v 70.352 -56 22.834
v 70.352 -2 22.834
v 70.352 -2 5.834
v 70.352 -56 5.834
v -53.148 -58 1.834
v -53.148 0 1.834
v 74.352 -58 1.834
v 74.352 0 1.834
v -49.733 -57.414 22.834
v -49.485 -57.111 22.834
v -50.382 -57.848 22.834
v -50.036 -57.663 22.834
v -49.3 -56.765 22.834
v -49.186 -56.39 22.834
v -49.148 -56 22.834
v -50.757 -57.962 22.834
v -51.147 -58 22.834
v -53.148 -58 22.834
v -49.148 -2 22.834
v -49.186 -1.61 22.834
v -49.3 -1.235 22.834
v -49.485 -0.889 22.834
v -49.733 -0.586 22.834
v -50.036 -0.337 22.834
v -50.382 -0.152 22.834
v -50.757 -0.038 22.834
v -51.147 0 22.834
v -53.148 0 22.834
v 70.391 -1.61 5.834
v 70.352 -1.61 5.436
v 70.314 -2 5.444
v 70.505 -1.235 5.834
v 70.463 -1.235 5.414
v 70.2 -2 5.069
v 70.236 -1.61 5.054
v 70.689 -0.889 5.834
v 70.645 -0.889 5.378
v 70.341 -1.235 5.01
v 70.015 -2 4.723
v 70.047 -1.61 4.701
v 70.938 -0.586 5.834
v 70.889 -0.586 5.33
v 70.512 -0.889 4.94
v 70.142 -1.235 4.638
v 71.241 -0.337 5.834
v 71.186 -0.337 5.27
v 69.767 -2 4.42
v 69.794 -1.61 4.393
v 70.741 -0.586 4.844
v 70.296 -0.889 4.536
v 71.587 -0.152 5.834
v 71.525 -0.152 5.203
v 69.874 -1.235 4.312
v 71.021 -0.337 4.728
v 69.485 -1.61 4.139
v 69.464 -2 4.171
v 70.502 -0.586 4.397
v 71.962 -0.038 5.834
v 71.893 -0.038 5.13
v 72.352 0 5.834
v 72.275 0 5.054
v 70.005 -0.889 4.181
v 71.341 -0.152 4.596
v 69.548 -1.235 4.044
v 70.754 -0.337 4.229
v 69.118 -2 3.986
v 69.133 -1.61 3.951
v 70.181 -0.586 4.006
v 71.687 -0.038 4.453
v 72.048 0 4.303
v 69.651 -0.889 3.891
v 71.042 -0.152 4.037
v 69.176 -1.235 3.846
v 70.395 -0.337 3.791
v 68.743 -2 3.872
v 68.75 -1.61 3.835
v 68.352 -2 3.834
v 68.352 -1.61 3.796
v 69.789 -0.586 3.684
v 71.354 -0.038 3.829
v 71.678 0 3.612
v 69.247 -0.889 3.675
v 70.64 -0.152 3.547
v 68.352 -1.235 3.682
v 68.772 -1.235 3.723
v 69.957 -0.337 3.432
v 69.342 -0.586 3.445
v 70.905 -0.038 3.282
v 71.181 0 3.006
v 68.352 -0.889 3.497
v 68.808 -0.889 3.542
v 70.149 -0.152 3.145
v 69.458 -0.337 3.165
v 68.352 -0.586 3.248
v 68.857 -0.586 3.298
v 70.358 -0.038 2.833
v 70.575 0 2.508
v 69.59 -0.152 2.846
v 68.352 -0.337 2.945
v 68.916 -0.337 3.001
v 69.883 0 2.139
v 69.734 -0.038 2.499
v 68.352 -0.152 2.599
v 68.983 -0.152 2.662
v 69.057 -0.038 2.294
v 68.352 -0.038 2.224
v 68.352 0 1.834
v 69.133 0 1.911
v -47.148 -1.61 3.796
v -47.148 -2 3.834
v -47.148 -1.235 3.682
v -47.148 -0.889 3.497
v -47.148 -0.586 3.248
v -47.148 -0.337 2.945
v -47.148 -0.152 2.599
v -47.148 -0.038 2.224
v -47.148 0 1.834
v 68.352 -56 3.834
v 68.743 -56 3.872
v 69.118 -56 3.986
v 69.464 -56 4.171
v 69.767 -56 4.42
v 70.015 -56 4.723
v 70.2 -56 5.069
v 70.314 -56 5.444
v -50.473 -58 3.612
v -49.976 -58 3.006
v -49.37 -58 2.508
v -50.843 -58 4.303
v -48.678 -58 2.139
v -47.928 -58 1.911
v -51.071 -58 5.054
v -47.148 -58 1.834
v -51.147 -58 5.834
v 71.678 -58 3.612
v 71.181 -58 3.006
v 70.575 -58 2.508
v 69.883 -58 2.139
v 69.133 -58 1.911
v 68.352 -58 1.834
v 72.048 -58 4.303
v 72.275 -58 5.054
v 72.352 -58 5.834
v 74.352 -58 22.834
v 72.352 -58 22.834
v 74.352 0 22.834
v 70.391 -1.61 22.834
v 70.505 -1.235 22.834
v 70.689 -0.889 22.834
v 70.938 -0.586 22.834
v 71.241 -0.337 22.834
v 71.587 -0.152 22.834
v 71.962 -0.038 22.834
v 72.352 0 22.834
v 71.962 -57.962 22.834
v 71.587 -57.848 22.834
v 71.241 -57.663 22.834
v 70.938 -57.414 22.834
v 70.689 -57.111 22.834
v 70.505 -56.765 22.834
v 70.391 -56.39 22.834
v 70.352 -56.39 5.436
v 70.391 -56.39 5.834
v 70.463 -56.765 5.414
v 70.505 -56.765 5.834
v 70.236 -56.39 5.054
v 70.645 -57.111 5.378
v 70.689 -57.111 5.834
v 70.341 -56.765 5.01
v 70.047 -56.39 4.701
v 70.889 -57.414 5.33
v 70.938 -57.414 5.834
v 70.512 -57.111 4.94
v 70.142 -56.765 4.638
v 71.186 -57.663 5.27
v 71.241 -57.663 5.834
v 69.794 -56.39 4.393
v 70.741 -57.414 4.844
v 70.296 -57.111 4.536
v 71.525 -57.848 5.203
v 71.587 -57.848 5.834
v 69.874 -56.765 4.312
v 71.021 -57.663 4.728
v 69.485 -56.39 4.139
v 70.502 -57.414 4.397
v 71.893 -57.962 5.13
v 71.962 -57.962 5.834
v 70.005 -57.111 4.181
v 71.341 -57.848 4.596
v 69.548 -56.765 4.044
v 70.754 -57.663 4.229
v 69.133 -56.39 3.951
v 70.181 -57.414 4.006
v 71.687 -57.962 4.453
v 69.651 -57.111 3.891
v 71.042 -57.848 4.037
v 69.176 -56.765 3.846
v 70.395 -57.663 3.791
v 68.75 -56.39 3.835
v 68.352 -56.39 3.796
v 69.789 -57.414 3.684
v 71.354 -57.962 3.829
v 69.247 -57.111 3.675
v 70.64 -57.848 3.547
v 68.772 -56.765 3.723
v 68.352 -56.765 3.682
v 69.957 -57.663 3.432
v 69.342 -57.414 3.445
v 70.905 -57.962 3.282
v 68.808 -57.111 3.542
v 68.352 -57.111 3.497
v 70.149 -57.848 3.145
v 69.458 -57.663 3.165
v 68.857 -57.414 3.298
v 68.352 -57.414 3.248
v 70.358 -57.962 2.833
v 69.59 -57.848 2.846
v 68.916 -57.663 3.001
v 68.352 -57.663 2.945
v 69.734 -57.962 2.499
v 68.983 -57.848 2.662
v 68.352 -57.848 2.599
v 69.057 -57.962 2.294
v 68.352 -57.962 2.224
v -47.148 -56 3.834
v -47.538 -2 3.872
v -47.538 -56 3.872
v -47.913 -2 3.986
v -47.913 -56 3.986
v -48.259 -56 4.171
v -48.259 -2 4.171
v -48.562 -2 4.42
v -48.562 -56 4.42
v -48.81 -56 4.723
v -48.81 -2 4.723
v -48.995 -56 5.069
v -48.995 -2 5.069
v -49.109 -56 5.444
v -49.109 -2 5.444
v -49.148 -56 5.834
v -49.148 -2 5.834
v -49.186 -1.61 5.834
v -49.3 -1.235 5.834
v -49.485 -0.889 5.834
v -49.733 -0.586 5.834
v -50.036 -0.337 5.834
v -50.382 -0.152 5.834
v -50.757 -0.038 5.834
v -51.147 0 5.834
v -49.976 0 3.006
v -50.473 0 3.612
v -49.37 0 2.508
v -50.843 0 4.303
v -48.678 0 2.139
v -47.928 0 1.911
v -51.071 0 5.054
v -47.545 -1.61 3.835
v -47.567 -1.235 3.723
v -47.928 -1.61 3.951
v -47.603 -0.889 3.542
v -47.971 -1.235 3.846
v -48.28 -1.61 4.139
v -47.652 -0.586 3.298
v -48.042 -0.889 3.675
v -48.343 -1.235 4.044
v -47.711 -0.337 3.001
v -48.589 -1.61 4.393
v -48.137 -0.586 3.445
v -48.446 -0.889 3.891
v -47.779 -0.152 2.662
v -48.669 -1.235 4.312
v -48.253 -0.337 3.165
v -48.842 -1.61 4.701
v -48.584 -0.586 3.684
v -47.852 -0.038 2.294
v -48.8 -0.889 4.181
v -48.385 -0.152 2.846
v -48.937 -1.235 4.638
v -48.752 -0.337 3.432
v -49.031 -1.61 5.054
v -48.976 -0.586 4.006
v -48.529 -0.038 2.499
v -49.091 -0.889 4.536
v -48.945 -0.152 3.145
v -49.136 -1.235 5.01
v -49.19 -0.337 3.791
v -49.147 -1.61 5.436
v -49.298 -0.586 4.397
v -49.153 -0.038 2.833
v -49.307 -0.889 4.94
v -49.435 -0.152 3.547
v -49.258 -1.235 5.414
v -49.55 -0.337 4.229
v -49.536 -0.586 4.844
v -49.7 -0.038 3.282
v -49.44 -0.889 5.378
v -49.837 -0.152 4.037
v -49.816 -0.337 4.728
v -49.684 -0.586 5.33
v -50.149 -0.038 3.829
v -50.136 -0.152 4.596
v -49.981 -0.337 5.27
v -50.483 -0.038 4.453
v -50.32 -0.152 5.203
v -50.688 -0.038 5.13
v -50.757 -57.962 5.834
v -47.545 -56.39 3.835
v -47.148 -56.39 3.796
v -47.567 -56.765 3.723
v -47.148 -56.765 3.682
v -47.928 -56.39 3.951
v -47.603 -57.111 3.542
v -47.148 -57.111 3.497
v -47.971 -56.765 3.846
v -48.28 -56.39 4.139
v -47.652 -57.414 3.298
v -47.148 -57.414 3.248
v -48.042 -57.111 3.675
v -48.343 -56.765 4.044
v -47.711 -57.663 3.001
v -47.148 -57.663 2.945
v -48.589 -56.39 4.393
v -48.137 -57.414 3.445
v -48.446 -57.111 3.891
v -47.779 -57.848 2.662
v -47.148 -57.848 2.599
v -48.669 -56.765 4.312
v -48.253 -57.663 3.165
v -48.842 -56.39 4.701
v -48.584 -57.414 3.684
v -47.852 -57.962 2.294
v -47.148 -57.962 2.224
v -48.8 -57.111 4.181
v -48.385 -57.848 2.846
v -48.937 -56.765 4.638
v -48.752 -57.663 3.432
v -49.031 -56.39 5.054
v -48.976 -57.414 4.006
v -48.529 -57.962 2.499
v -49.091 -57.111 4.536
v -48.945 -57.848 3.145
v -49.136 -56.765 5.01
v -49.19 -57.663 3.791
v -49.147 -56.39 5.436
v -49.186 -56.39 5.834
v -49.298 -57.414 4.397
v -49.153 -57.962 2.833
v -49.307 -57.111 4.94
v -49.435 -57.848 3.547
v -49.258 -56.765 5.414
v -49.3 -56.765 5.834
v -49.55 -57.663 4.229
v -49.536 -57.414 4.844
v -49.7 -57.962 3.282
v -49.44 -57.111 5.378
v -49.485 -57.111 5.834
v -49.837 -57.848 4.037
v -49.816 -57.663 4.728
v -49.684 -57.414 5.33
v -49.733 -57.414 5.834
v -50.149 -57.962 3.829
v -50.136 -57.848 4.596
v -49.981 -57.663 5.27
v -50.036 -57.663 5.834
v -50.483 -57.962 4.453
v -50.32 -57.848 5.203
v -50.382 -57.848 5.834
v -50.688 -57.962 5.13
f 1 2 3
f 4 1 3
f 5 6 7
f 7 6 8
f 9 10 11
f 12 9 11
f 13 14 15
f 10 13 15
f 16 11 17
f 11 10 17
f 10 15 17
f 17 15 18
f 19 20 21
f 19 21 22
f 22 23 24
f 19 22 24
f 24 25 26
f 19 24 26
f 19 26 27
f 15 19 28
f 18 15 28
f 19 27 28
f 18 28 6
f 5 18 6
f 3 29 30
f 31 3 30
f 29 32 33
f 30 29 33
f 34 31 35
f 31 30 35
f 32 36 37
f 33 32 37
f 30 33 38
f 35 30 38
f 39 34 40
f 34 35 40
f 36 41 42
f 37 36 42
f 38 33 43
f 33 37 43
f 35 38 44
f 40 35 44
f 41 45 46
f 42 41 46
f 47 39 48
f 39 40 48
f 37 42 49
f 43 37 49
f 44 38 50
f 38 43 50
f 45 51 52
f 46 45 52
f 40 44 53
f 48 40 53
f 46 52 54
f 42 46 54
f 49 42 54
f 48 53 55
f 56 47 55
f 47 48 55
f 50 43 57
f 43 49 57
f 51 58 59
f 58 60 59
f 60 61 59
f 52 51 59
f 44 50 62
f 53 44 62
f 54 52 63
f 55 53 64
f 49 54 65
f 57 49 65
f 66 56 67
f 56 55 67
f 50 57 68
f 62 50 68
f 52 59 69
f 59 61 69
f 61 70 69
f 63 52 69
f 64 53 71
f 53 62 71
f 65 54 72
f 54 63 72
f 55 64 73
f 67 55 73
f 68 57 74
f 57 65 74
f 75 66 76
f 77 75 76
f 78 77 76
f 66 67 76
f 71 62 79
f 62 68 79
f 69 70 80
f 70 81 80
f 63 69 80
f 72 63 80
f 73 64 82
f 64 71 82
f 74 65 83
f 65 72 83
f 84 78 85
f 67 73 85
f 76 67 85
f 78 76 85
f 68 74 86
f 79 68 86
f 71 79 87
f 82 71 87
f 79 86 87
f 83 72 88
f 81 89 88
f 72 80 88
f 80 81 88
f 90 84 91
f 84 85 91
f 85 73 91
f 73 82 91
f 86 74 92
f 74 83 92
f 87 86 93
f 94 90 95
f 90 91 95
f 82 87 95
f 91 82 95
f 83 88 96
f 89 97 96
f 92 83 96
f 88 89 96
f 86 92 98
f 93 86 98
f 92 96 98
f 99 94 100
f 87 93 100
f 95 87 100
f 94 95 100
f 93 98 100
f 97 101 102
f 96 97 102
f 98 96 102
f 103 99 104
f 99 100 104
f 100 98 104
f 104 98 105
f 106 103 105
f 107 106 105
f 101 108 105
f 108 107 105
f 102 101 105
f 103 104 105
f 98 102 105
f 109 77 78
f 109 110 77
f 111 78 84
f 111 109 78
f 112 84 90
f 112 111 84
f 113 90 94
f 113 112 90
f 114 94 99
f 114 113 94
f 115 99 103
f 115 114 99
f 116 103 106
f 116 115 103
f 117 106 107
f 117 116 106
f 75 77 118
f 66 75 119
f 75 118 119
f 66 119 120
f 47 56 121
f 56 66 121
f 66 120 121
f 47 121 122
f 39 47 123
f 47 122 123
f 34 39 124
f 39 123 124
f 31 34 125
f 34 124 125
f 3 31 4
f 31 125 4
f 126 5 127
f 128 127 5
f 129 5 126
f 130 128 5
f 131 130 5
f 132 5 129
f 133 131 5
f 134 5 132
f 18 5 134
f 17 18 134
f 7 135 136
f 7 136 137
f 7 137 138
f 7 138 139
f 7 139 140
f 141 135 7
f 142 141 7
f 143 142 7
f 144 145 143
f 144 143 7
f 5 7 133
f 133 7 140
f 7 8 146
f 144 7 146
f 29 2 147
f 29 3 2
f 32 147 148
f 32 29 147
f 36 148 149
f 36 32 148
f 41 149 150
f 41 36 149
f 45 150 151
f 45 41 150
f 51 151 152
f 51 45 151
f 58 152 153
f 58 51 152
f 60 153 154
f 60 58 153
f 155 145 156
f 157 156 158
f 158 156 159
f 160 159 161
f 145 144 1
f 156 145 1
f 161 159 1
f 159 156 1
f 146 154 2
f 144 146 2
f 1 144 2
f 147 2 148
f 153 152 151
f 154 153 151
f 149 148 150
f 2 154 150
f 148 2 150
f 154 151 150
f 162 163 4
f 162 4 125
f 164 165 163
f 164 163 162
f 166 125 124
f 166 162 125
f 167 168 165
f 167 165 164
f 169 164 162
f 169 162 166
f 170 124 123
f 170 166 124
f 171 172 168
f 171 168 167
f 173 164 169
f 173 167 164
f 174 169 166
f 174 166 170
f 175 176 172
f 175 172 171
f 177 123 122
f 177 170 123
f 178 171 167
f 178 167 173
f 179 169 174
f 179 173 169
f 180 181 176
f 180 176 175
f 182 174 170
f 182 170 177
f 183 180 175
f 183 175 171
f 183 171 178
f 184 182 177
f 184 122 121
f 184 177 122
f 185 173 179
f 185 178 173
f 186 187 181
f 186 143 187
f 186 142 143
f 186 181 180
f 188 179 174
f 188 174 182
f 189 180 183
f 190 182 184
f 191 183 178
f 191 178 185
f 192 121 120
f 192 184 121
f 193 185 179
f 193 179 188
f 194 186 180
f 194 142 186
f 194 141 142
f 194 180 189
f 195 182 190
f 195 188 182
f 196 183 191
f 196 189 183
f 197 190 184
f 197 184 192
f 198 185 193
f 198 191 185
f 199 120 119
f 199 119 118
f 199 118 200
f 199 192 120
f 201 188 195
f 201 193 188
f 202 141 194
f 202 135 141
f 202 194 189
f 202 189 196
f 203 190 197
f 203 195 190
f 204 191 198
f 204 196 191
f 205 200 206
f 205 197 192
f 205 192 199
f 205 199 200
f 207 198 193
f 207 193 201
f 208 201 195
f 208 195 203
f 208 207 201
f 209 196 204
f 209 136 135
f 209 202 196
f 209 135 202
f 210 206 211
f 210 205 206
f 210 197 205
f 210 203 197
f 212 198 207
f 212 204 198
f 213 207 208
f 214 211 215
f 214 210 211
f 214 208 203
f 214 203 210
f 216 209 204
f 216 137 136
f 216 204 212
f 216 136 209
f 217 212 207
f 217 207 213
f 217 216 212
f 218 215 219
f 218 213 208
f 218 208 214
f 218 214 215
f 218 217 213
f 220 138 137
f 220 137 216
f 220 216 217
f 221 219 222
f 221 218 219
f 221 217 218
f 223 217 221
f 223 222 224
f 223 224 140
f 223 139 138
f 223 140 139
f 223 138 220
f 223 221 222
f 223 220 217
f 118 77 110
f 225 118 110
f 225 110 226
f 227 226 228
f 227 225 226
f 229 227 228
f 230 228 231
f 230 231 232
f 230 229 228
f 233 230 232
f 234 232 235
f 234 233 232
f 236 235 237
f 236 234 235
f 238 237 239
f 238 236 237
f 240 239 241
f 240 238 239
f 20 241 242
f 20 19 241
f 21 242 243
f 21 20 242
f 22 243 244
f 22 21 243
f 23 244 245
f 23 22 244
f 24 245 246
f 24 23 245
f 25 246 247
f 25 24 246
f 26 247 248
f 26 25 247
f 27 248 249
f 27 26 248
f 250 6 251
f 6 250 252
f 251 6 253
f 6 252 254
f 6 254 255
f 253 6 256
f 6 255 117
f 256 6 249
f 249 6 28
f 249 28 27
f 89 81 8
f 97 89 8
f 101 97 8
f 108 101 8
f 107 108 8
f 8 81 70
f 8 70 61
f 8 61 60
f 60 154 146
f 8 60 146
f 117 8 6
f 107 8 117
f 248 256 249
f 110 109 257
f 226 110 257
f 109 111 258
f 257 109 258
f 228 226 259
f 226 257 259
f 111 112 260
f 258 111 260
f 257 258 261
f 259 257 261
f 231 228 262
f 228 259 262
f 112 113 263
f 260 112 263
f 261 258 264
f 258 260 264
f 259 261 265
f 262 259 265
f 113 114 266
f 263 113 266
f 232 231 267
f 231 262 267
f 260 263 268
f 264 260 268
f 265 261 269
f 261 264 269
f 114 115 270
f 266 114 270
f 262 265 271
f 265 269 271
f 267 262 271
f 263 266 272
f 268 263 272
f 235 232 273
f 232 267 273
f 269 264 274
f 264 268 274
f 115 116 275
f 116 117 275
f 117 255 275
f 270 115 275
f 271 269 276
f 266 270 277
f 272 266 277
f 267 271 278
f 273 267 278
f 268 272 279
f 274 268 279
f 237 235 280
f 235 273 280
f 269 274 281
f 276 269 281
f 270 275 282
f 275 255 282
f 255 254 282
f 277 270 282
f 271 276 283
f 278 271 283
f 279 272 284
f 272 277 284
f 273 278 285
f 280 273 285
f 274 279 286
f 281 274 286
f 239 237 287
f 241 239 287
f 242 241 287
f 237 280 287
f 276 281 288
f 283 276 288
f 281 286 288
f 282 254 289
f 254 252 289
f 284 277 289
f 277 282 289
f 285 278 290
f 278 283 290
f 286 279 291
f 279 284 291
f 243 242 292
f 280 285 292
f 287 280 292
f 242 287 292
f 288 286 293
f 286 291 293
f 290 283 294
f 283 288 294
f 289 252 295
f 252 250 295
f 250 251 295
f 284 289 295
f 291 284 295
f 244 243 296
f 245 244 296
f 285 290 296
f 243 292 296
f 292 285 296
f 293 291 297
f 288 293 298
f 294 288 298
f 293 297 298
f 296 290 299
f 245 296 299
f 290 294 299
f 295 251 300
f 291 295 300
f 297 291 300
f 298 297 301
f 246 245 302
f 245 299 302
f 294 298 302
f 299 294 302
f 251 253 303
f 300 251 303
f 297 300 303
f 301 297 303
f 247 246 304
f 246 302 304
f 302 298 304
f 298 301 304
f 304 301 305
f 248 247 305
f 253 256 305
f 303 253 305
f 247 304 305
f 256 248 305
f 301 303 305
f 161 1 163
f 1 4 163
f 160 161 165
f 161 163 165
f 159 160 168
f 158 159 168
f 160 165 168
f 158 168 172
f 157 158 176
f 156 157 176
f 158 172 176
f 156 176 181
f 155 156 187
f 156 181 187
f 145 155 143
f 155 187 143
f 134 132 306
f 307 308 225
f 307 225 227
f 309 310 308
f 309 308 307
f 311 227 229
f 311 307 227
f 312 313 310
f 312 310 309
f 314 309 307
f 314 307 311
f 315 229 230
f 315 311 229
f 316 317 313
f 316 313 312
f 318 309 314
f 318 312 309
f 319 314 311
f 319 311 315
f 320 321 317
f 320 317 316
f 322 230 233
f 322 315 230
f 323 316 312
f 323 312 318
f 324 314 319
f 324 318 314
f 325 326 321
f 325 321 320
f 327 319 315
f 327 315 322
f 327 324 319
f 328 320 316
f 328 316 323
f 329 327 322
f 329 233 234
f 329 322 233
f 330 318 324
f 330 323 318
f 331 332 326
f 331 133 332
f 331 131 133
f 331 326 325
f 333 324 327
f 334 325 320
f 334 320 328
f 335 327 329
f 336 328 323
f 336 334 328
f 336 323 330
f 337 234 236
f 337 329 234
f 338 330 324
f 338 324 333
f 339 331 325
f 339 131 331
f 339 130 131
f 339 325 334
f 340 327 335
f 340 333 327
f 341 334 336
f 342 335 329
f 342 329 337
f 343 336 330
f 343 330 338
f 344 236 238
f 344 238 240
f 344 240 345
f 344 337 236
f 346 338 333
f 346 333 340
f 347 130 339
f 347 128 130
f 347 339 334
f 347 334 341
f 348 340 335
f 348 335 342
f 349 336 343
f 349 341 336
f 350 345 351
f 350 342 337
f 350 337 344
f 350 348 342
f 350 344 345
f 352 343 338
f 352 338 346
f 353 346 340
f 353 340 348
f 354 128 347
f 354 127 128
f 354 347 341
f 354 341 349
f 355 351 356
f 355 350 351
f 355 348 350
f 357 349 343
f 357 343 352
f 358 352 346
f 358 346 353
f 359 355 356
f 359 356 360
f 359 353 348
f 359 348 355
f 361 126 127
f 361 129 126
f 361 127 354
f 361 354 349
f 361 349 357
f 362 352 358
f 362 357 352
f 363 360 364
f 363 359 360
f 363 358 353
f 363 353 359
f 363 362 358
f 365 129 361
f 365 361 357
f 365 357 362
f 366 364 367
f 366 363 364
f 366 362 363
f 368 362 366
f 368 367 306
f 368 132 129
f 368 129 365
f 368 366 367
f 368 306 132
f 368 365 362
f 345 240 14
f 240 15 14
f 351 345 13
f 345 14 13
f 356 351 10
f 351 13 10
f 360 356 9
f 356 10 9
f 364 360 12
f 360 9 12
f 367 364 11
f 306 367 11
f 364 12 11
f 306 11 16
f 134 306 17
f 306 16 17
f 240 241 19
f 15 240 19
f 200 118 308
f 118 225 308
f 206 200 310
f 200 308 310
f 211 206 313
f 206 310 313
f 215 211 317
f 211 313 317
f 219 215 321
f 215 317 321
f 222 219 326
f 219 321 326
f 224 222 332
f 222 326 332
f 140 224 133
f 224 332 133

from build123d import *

# Parameters (mm, degrees)
F1_DEPTH = 58
F2_F1_R  = 2
F2_F2_R  = 1.9999


# Not quite as in the source:
# - a fillet or chamfer is up to 0.001 mm smaller than in the source, because OpenCascade refuses the exact size


with BuildPart() as f1:
    # F0 (on Front) → F1 (new body)
    with BuildSketch(Plane.XZ):
        Polygon((70.3524513997, 3.8339729243), (-49.1475486003, 3.8339729243), (-49.1475486003, 22.8339729243), (-53.1475486003, 22.8339729243), (-53.1475486003, 1.8339729243), (74.3524513997, 1.8339729243), (74.3524513997, 22.8339729243), (70.3524513997, 22.8339729243), align=None)
    extrude(amount=F1_DEPTH)

    # F2: fillet of radius 2 on 4 edges, made by hand

    # F2_f1
    f2_f1_edges = [f1.edges().sort_by_distance(p)[0] for p in [
        (70.3524513997, -29, 3.8339729243),
        (-49.1475486003, -29, 3.8339729243),
    ]]
    fillet(f2_f1_edges, radius=F2_F1_R)

    # F2_f2 (radius 2 in the source; OpenCascade refuses exactly that, so slightly less here)
    f2_f2_edges = [f1.edges().sort_by_distance(p)[0] for p in [
        (10.6024513997, 0, 3.8339729243),
        (10.6024513997, -58, 3.8339729243),
        (69.766664962, -58, 4.4197593619),
        (-48.5617621627, -58, 4.4197593619),
        (69.766664962, 0, 4.4197593619),
        (-48.5617621627, 0, 4.4197593619),
    ]]
    fillet(f2_f2_edges, radius=F2_F2_R)


solid = f1.part
